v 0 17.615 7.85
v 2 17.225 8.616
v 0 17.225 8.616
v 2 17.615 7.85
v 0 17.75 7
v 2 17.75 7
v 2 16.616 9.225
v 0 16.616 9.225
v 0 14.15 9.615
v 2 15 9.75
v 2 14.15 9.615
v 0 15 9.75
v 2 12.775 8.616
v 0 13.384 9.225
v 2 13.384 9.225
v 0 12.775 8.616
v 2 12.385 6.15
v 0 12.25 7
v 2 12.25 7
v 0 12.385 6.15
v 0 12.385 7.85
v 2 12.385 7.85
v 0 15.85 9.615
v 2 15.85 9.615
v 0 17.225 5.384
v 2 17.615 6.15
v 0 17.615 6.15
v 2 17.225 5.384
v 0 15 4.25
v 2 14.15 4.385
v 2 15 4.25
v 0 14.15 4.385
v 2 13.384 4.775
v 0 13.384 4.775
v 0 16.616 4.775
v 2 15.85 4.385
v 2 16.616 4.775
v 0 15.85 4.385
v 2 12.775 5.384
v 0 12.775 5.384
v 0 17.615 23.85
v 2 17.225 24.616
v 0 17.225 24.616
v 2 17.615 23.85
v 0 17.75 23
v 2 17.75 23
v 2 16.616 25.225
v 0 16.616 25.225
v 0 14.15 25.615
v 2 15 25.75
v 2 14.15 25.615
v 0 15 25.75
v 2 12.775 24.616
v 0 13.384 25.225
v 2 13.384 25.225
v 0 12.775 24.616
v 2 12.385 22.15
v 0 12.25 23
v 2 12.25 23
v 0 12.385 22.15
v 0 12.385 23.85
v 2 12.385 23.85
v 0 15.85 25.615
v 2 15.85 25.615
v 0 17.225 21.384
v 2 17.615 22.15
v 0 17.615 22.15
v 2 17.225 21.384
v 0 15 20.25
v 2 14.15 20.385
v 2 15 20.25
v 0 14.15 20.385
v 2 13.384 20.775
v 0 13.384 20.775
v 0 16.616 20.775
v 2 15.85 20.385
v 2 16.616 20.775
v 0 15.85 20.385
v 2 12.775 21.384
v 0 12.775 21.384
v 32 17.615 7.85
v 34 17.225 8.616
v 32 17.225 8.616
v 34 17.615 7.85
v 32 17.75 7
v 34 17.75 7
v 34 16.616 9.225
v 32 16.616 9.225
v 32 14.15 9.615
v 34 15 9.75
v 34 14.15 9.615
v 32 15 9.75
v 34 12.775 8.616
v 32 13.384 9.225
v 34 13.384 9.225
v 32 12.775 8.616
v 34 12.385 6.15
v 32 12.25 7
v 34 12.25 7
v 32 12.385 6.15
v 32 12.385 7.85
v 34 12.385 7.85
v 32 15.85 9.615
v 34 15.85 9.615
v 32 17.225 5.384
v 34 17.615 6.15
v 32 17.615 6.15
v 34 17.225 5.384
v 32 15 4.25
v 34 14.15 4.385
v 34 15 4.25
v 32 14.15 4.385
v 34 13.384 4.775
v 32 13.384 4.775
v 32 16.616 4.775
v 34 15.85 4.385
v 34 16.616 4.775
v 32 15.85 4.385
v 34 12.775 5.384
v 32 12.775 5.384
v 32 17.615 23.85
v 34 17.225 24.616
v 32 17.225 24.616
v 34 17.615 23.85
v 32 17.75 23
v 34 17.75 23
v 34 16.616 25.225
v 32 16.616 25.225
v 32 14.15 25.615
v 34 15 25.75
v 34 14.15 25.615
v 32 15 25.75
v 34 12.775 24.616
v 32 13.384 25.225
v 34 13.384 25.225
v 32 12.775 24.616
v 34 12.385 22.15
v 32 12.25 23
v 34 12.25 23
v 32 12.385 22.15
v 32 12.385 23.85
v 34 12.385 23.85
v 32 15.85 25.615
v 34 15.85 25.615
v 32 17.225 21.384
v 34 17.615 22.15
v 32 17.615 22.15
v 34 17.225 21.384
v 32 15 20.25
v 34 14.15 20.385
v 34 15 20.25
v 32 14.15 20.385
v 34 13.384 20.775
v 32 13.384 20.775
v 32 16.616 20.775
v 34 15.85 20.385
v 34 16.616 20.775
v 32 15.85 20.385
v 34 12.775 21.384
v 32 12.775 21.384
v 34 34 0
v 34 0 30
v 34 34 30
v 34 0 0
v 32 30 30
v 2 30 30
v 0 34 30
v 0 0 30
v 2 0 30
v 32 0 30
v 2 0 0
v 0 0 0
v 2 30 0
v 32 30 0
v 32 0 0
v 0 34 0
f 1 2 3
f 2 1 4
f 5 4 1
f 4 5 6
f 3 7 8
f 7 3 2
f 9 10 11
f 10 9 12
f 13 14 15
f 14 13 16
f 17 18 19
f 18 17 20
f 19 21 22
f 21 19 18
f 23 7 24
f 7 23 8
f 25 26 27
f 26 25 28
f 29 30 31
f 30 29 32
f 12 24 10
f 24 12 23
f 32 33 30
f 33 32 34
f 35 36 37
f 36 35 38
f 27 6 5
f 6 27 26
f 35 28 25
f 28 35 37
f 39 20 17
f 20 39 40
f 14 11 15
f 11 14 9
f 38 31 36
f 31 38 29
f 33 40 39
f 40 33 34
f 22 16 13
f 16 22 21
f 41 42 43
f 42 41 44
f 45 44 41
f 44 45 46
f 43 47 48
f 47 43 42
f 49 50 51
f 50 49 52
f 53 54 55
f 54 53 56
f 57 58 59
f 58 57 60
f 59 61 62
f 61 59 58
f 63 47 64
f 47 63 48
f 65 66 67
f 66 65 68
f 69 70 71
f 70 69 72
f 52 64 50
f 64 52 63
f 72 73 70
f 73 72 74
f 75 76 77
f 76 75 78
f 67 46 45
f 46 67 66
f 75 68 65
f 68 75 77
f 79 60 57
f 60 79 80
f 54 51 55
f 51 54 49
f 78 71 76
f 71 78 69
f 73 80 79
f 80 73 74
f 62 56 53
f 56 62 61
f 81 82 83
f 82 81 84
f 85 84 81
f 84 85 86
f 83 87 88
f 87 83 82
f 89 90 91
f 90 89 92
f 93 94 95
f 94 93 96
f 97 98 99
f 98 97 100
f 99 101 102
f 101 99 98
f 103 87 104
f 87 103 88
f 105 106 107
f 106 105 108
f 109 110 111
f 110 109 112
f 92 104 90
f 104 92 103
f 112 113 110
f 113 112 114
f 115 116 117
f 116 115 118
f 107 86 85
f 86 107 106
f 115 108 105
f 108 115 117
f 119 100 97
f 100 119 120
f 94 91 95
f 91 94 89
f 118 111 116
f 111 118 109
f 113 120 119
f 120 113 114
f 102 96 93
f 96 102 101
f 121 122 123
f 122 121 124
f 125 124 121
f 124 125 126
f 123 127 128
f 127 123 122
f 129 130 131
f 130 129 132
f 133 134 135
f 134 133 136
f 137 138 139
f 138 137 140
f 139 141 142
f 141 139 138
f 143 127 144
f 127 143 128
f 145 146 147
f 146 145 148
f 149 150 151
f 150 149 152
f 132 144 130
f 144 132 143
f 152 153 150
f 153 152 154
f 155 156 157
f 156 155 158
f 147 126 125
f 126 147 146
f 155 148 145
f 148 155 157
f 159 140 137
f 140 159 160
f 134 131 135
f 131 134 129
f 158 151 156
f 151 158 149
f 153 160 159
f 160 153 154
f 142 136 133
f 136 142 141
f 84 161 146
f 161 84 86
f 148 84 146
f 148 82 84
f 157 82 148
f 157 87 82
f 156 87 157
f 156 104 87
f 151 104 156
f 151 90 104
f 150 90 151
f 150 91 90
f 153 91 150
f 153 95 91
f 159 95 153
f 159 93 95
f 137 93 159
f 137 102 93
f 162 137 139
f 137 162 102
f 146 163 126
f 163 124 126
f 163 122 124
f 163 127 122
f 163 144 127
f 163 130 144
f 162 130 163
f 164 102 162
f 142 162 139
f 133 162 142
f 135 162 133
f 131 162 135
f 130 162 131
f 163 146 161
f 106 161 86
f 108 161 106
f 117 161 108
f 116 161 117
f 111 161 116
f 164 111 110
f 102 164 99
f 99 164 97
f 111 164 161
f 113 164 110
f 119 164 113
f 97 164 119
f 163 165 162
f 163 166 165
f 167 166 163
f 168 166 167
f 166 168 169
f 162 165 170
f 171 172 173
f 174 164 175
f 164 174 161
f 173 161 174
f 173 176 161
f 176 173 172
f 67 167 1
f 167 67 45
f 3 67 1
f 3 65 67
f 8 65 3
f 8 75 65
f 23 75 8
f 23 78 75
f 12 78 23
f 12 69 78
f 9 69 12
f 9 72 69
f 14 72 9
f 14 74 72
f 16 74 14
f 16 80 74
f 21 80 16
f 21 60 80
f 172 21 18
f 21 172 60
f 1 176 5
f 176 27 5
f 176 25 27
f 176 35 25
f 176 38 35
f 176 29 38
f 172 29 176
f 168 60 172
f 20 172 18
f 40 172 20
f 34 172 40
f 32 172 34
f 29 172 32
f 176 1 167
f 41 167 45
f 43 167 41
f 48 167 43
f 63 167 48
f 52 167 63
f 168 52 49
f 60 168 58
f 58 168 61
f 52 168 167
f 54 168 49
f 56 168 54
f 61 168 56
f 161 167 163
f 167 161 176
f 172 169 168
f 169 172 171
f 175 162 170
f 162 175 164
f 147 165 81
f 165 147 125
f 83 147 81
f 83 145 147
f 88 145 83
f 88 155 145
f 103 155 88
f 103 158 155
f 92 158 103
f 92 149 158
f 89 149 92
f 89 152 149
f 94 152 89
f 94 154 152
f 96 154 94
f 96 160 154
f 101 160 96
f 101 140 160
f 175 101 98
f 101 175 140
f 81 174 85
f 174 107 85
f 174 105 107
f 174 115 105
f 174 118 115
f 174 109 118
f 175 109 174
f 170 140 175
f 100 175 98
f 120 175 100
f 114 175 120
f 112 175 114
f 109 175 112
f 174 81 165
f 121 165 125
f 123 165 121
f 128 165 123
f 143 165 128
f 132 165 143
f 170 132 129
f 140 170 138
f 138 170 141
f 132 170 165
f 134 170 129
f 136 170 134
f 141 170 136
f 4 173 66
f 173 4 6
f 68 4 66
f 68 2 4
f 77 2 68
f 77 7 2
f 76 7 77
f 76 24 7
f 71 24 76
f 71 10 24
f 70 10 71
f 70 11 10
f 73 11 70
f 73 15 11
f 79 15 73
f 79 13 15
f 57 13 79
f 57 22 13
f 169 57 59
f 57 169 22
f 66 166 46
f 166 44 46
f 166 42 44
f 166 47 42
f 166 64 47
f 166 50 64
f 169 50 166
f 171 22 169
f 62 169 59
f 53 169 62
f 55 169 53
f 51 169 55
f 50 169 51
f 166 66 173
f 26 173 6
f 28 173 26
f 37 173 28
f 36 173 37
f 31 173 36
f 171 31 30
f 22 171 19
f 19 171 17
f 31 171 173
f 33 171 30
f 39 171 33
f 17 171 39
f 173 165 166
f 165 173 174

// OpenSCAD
include <../../parameters.scad>



module ALU_profile_holder() {
    wall_thickness = 2;
    
    //díry na přišroubování k Al profilům
    module screws_holes(diameter) {
        translate([0, 0, 7])
            rotate([90, 0, 90])
                cylinder(d=diameter, h=wall_thickness*2, center=true, $fn=20);
        
        translate([0, 0, strain_gauge_screw_distance+13])
            rotate([90, 0, 90])
                cylinder(d=diameter, h=wall_thickness*2, center=true, $fn=20);
    }
    
    difference() {
        cube([ALU_profile_width+wall_thickness*2, ALU_profile_width+wall_thickness*2, strain_gauge_screw_distance+20]);

        translate([wall_thickness, 0, 0])
        cube([ALU_profile_width, ALU_profile_width, strain_gauge_screw_distance+20]);
        
        translate([wall_thickness*0.5, ALU_profile_width/2, 0]) {
                screws_holes(M5_screw_diameter);
                translate([ALU_profile_width+wall_thickness, 0, 0]) {
                    screws_holes(M5_screw_diameter);
                }
        }
    }
}

ALU_profile_holder();
